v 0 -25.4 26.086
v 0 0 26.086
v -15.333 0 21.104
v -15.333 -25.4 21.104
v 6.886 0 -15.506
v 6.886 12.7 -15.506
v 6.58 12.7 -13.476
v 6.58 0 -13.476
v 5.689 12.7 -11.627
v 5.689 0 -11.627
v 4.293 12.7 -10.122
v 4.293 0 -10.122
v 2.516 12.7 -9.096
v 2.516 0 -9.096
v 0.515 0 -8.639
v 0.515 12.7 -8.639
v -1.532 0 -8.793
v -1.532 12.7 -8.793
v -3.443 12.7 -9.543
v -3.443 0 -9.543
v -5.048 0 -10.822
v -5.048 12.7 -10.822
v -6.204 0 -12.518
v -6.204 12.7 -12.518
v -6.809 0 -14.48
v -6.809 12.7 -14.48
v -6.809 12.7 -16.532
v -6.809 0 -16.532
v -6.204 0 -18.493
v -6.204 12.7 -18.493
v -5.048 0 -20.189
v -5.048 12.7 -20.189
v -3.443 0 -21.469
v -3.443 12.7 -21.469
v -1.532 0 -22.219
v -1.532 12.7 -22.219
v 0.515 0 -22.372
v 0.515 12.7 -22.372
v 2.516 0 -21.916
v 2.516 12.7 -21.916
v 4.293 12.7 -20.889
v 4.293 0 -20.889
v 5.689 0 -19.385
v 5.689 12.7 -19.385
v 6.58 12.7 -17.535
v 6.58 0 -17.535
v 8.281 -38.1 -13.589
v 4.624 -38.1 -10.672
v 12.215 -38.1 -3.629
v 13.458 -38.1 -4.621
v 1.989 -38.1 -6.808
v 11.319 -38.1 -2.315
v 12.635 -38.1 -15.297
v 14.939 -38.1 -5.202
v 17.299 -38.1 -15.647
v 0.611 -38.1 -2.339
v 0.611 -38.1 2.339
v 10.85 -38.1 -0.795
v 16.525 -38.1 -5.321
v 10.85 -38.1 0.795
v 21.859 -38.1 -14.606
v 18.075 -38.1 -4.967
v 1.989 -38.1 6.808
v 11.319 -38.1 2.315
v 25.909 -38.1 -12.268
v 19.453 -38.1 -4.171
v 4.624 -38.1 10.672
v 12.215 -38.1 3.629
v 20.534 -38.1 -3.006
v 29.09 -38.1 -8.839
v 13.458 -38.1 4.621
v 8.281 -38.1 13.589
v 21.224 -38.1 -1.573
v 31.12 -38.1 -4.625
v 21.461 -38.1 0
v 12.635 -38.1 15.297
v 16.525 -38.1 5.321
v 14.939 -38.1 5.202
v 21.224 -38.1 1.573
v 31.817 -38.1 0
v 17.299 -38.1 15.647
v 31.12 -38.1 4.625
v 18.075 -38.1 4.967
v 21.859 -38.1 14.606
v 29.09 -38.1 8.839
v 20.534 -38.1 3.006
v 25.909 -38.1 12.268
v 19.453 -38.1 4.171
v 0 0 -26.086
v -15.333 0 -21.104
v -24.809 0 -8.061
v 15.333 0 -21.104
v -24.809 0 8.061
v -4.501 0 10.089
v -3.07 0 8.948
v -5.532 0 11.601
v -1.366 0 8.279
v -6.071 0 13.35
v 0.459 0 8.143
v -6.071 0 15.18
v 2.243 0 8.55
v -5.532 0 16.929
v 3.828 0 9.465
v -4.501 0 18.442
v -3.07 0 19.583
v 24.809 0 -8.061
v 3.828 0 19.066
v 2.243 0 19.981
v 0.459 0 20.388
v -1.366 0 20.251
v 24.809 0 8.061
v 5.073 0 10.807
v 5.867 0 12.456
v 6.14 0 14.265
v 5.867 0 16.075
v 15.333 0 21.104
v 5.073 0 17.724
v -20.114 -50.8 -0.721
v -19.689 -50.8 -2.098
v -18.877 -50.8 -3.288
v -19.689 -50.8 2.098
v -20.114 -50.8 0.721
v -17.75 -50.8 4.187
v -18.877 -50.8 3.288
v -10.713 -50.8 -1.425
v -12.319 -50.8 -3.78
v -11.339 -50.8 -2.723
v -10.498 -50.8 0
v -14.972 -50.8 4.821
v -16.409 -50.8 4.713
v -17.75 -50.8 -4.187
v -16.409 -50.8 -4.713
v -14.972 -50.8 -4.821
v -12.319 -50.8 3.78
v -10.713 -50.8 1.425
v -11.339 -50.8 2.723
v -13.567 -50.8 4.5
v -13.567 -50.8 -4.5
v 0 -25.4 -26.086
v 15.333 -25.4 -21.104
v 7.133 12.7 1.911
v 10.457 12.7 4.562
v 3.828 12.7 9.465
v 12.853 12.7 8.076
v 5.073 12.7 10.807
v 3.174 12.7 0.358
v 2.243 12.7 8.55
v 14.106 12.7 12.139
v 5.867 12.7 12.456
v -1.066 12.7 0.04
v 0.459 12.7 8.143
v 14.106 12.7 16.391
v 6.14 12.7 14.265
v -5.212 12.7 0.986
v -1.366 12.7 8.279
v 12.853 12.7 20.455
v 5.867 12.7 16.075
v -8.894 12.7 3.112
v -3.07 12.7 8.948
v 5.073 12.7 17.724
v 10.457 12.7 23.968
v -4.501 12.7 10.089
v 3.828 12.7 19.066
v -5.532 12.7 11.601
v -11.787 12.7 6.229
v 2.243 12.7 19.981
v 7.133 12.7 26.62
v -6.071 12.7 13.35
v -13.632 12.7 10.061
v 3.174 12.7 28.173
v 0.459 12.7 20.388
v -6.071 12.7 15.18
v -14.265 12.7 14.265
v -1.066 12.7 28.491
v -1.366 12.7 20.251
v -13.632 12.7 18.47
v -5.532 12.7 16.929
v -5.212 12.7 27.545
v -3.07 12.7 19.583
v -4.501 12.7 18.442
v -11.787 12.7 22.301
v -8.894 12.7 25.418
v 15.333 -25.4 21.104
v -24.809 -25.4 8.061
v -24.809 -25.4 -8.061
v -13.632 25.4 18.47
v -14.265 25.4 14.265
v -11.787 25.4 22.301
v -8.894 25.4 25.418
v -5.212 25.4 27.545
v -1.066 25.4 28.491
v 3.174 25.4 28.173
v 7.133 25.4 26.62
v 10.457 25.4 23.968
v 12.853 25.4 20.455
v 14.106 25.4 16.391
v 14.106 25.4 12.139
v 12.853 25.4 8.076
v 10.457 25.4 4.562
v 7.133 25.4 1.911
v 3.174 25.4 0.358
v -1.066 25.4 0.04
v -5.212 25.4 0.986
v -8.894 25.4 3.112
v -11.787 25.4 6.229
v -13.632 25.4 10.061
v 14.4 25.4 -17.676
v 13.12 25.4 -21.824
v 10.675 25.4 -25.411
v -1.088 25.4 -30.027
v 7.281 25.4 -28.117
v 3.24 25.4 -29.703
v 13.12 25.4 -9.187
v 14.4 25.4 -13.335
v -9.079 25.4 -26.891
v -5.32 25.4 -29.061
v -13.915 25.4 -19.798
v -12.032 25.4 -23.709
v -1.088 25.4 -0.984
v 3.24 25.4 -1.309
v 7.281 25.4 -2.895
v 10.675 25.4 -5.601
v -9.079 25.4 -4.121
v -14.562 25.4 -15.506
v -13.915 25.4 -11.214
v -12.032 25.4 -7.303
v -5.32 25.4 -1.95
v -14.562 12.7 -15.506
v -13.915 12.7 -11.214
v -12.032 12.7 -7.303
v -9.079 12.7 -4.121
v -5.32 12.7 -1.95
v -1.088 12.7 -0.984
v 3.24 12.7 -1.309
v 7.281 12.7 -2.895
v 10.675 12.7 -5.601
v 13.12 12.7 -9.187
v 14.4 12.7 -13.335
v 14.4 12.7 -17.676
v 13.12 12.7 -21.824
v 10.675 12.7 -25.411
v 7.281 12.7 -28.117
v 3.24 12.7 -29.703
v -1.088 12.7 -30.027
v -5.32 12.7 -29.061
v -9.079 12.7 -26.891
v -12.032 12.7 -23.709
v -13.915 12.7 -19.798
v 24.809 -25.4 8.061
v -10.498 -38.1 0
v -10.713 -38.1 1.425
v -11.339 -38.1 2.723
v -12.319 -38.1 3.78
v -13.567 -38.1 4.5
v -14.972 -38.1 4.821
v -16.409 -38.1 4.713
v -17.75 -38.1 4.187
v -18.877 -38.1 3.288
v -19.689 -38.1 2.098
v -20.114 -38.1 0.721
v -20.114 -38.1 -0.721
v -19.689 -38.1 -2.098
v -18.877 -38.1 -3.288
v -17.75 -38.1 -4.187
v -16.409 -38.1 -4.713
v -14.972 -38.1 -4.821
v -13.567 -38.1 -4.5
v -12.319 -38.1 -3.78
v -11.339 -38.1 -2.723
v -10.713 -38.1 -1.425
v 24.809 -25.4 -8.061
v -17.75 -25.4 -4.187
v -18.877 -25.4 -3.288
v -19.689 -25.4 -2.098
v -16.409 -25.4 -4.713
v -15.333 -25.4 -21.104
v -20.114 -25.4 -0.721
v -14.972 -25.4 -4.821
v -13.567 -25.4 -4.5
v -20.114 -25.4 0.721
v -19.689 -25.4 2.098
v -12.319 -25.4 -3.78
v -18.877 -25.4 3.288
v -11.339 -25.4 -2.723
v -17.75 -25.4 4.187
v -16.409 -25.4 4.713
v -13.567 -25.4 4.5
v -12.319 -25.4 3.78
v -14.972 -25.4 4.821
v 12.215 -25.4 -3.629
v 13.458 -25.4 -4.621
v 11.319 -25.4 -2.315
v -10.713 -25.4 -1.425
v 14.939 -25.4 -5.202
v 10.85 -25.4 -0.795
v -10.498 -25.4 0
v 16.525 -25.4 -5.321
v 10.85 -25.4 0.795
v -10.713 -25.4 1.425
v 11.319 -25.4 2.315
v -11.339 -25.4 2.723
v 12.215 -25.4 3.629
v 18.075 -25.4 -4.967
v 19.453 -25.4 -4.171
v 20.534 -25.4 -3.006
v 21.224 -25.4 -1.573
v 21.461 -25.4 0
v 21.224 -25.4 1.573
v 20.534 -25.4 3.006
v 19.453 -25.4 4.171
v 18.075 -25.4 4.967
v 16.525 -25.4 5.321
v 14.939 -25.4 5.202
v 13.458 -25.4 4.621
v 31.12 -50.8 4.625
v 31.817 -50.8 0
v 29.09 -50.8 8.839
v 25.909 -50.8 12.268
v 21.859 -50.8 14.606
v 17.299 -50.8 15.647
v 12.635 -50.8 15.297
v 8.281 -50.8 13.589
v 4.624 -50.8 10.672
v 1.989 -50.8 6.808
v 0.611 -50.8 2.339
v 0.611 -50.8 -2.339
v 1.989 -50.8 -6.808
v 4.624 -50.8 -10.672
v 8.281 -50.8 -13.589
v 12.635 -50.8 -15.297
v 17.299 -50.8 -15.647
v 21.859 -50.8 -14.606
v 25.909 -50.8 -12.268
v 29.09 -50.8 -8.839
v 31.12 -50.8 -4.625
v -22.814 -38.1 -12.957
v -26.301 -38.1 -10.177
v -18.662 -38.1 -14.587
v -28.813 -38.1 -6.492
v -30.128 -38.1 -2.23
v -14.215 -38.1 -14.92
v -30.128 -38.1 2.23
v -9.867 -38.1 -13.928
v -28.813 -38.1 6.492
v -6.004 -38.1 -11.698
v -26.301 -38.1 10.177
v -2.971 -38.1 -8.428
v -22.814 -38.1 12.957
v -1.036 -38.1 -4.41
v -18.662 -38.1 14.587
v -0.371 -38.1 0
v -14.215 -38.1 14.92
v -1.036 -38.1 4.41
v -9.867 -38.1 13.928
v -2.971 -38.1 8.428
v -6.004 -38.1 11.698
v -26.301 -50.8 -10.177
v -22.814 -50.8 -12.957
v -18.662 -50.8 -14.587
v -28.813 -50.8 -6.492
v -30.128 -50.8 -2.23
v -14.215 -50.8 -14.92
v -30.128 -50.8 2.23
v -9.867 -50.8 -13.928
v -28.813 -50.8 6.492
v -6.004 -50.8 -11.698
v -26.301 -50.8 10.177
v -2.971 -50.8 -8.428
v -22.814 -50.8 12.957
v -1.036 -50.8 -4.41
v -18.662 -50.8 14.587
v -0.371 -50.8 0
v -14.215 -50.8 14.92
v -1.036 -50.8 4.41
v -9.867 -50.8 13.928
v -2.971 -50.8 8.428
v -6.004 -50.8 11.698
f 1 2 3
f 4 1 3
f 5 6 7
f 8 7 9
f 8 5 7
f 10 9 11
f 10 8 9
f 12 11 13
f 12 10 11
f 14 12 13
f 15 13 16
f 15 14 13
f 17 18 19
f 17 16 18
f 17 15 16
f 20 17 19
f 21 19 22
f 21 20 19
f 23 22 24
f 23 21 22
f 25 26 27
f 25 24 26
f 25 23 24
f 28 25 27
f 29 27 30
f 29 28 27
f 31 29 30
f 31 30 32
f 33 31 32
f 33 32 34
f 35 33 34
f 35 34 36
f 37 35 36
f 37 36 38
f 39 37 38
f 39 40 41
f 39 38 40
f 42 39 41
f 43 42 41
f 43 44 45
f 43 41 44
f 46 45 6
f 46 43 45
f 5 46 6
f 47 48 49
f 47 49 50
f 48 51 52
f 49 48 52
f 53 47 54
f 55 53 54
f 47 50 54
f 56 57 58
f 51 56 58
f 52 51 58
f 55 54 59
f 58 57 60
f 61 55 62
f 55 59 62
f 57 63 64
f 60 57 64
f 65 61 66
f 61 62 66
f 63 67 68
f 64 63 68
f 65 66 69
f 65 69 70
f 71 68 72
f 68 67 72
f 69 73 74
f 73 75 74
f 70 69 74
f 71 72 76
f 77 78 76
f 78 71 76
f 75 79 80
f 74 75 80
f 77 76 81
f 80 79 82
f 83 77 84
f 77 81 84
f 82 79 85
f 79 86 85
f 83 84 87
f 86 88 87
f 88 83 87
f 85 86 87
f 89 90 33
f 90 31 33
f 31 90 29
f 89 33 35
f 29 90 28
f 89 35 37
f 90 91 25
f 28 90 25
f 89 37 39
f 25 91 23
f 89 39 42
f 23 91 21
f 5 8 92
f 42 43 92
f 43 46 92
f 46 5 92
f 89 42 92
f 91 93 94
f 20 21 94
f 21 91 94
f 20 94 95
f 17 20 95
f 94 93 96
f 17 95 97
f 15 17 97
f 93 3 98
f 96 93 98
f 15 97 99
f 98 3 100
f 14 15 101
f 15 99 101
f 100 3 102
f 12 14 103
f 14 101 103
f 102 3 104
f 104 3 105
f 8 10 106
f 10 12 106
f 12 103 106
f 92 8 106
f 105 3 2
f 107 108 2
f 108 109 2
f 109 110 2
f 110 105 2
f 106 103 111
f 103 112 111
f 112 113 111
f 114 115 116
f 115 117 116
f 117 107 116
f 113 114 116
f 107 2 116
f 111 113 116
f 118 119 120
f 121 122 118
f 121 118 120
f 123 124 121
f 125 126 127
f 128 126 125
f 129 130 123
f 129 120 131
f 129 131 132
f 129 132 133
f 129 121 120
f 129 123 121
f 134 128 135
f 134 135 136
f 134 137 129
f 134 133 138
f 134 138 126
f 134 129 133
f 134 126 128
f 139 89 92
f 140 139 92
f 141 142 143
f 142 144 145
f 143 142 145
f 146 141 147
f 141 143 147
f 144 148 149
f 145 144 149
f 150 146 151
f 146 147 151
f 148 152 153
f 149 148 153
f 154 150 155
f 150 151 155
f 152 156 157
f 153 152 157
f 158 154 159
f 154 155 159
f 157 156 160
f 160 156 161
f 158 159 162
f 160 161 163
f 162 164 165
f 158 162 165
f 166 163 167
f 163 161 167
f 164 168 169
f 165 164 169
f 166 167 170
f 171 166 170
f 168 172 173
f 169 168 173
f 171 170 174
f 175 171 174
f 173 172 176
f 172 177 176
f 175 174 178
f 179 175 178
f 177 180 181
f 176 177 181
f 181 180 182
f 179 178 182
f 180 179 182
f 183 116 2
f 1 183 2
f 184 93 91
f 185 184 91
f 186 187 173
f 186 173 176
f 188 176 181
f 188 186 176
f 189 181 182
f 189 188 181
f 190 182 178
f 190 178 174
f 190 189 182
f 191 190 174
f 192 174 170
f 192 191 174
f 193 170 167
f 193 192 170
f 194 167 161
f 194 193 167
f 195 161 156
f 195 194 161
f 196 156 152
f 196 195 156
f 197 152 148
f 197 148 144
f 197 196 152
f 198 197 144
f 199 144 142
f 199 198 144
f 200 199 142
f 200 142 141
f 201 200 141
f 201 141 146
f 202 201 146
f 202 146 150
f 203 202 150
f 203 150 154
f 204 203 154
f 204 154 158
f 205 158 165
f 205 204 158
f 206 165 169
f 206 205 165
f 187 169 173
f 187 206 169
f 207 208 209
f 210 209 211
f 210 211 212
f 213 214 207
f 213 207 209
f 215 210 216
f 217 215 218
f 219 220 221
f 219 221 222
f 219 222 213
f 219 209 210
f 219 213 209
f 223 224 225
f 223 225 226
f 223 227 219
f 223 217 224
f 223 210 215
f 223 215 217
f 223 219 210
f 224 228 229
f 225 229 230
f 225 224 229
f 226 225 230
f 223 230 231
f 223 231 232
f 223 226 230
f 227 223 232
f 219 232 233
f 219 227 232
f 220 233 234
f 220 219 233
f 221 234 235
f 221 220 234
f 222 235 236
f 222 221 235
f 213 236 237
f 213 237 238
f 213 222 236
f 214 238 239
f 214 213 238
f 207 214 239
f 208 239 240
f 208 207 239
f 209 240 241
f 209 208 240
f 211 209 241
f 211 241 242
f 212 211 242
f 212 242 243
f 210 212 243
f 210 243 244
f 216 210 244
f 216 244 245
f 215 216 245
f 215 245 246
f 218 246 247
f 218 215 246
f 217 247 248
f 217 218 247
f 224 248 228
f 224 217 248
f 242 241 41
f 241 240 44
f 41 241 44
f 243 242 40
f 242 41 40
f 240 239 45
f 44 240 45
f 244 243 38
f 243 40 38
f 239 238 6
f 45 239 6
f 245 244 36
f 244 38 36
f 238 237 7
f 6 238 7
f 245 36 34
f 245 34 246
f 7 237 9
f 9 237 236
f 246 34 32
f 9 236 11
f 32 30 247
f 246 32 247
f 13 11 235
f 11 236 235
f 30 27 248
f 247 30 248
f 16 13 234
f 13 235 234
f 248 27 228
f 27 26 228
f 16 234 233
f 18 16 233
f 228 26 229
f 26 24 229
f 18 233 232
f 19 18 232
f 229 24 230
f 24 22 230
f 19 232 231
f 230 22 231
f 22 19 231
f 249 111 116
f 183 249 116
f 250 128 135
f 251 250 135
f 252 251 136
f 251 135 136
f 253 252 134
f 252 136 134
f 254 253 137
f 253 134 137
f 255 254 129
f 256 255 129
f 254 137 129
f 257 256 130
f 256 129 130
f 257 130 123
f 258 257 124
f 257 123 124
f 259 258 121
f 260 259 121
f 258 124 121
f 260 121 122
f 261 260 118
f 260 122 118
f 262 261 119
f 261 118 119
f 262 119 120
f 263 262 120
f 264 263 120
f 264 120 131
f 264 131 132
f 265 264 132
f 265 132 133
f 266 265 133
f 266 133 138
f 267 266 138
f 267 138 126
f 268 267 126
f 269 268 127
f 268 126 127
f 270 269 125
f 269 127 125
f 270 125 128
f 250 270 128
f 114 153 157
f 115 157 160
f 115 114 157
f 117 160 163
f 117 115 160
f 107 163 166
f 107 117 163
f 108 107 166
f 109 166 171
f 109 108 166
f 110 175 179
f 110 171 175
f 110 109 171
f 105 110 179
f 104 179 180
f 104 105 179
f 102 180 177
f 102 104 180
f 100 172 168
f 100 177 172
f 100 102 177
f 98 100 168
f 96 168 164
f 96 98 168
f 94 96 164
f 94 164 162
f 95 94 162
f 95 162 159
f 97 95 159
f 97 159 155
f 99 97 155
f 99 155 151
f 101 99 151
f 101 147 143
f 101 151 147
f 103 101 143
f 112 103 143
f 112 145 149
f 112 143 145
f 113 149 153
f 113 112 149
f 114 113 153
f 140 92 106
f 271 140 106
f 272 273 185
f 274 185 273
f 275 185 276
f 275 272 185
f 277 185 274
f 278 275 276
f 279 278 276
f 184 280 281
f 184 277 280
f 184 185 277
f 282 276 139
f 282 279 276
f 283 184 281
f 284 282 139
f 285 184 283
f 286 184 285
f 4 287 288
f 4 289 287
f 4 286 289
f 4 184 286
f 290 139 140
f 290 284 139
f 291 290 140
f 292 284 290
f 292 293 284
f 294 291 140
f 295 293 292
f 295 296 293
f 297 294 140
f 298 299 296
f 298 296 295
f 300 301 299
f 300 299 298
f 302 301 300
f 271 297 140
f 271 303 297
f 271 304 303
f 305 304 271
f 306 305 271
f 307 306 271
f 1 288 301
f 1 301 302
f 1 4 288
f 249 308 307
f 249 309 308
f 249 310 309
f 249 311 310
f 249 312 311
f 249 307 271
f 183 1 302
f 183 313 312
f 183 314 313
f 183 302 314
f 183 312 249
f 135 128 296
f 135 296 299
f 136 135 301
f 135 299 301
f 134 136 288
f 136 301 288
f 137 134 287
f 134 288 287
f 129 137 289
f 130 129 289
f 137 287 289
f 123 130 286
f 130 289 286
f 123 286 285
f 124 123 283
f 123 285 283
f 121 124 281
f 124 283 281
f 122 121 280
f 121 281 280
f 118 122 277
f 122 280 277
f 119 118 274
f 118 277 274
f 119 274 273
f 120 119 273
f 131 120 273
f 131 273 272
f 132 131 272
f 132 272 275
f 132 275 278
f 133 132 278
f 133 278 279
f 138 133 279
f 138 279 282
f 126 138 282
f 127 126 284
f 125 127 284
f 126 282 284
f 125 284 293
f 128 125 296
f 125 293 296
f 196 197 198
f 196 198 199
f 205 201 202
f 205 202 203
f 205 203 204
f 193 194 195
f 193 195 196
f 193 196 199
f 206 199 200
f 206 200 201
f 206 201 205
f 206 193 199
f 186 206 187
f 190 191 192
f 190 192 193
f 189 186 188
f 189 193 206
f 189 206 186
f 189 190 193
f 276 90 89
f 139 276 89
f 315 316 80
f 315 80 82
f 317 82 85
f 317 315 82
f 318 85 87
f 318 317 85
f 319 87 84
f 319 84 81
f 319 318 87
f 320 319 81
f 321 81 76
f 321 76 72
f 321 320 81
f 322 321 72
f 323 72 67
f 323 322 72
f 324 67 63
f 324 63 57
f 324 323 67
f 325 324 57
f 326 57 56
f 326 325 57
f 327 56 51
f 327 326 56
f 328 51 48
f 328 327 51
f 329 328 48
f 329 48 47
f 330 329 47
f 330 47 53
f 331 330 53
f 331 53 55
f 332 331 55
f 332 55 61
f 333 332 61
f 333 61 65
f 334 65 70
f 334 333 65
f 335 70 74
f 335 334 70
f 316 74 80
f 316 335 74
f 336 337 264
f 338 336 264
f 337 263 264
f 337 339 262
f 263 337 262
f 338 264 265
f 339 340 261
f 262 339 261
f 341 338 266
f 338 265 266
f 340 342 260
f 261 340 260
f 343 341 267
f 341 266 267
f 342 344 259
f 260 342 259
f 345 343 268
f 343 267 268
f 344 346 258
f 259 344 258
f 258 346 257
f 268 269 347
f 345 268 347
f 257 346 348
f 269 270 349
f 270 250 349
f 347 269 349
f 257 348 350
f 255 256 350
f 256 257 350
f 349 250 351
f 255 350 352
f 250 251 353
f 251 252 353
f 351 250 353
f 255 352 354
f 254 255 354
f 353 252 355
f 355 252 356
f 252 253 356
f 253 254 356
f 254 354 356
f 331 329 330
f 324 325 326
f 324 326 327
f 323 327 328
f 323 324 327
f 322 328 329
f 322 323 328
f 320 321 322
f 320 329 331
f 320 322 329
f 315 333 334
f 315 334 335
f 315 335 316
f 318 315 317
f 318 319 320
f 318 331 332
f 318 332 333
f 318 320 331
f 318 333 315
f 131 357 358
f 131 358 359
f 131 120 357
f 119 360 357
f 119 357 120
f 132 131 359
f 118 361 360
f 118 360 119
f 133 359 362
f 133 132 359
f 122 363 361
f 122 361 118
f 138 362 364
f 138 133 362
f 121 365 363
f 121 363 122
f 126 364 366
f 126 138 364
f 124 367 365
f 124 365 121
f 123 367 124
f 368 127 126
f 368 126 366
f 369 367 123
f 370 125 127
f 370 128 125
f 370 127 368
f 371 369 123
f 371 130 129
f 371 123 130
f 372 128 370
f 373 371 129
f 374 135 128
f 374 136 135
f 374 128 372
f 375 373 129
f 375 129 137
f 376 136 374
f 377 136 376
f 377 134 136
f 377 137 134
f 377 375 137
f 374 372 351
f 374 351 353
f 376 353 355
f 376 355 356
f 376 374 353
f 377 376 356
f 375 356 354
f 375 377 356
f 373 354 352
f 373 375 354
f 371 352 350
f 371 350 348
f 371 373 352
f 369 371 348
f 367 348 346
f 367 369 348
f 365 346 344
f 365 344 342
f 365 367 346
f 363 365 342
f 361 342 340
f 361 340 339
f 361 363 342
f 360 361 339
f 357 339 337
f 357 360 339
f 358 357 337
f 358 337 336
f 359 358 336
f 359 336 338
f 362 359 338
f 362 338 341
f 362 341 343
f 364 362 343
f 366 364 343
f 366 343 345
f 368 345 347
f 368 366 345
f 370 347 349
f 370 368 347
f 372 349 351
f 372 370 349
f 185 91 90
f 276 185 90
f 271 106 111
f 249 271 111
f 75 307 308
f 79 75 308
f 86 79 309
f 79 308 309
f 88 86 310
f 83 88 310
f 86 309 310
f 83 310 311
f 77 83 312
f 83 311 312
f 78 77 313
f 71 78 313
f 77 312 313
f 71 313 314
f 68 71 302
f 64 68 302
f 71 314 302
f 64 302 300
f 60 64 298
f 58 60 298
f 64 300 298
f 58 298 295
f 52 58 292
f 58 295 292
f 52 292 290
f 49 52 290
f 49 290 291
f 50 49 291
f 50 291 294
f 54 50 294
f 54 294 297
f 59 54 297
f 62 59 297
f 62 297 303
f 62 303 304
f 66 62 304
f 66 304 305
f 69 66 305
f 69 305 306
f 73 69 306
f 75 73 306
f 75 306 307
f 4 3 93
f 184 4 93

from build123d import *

# Parameters (mm, degrees)
F1_DEPTH  = 25.4
F2_R      = 4.834523
F2_R_2    = 5.335441
F3_DEPTH  = 25.4
F4_R      = 6.139989
F4_R_2    = 6.885699
F5_DEPTH  = 50.8
F6_R      = 14.961829
F6_R_2    = 4.834523
F7_DEPTH  = 12.7
F8_R      = 15.690781
F8_R_2    = 5.335441
F9_DEPTH  = 12.7
F10_R     = 14.265348
F10_R_2   = 6.139989
F11_DEPTH = 12.7
F12_R     = 14.562262
F12_R_2   = 6.885699
F13_DEPTH = 12.7


with BuildPart() as f1:
    # F0 (on Front) → F1 (new body)
    with BuildSketch(Plane.XZ):
        Polygon((-24.809303, 8.061031), (-24.809303, -8.061031), (-15.332992, -21.104053), (0, -26.086045), (15.332992, -21.104053), (24.809303, -8.061031), (24.809303, 8.061031), (15.332992, 21.104053), (0, 26.086045), (-15.332992, 21.104053), align=None)
    extrude(amount=F1_DEPTH)

    # F2 (on face) → F3 (join)
    with BuildSketch(Plane.XZ.offset(25.4)):
        with Locations((-15.332992, 0)):
            Circle(F2_R)
        with Locations((16.126046, 0)):
            Circle(F2_R_2)
    extrude(amount=F3_DEPTH)

    # F4 (on face) → F5 (join)
    with BuildSketch(Plane.XZ.offset(25.4)):
        with Locations((0, 14.265348)):
            Circle(F4_R)
        with Locations((0, -15.505814)):
            Circle(F4_R_2)
    extrude(amount=-F5_DEPTH)

    # F8 (on face) → F9 (join)
    with BuildSketch(Plane.XZ.offset(50.8)):
        with Locations((16.126046, 0)):
            Circle(F8_R)
        with Locations((16.126046, 0)):
            Circle(F8_R_2, mode=Mode.SUBTRACT)
    extrude(amount=-F9_DEPTH)

    # F10 (on face) → F11 (join)
    with BuildSketch(Plane(origin=(0, 25.4, 0), x_dir=(-1, 0, 0), z_dir=(0, 1, 0))):
        with Locations((0, 14.265348)):
            Circle(F10_R)
        with Locations((0, 14.265348)):
            Circle(F10_R_2, mode=Mode.SUBTRACT)
    extrude(amount=-F11_DEPTH)

    # F12 (on face) → F13 (join)
    with BuildSketch(Plane(origin=(0, 25.4, 0), x_dir=(-1, 0, 0), z_dir=(0, 1, 0))):
        with Locations((0, -15.505814)):
            Circle(F12_R)
        with Locations((0, -15.505814)):
            Circle(F12_R_2, mode=Mode.SUBTRACT)
    extrude(amount=-F13_DEPTH)


with BuildPart() as f7:
    # F6 (on face) → F7 (new body)
    with BuildSketch(Plane.XZ.offset(50.8)):
        with Locations((-15.332992, 0)):
            Circle(F6_R)
        with Locations((-15.332992, 0)):
            Circle(F6_R_2, mode=Mode.SUBTRACT)
    extrude(amount=-F7_DEPTH)


solid = Compound([f1.part, f7.part])
